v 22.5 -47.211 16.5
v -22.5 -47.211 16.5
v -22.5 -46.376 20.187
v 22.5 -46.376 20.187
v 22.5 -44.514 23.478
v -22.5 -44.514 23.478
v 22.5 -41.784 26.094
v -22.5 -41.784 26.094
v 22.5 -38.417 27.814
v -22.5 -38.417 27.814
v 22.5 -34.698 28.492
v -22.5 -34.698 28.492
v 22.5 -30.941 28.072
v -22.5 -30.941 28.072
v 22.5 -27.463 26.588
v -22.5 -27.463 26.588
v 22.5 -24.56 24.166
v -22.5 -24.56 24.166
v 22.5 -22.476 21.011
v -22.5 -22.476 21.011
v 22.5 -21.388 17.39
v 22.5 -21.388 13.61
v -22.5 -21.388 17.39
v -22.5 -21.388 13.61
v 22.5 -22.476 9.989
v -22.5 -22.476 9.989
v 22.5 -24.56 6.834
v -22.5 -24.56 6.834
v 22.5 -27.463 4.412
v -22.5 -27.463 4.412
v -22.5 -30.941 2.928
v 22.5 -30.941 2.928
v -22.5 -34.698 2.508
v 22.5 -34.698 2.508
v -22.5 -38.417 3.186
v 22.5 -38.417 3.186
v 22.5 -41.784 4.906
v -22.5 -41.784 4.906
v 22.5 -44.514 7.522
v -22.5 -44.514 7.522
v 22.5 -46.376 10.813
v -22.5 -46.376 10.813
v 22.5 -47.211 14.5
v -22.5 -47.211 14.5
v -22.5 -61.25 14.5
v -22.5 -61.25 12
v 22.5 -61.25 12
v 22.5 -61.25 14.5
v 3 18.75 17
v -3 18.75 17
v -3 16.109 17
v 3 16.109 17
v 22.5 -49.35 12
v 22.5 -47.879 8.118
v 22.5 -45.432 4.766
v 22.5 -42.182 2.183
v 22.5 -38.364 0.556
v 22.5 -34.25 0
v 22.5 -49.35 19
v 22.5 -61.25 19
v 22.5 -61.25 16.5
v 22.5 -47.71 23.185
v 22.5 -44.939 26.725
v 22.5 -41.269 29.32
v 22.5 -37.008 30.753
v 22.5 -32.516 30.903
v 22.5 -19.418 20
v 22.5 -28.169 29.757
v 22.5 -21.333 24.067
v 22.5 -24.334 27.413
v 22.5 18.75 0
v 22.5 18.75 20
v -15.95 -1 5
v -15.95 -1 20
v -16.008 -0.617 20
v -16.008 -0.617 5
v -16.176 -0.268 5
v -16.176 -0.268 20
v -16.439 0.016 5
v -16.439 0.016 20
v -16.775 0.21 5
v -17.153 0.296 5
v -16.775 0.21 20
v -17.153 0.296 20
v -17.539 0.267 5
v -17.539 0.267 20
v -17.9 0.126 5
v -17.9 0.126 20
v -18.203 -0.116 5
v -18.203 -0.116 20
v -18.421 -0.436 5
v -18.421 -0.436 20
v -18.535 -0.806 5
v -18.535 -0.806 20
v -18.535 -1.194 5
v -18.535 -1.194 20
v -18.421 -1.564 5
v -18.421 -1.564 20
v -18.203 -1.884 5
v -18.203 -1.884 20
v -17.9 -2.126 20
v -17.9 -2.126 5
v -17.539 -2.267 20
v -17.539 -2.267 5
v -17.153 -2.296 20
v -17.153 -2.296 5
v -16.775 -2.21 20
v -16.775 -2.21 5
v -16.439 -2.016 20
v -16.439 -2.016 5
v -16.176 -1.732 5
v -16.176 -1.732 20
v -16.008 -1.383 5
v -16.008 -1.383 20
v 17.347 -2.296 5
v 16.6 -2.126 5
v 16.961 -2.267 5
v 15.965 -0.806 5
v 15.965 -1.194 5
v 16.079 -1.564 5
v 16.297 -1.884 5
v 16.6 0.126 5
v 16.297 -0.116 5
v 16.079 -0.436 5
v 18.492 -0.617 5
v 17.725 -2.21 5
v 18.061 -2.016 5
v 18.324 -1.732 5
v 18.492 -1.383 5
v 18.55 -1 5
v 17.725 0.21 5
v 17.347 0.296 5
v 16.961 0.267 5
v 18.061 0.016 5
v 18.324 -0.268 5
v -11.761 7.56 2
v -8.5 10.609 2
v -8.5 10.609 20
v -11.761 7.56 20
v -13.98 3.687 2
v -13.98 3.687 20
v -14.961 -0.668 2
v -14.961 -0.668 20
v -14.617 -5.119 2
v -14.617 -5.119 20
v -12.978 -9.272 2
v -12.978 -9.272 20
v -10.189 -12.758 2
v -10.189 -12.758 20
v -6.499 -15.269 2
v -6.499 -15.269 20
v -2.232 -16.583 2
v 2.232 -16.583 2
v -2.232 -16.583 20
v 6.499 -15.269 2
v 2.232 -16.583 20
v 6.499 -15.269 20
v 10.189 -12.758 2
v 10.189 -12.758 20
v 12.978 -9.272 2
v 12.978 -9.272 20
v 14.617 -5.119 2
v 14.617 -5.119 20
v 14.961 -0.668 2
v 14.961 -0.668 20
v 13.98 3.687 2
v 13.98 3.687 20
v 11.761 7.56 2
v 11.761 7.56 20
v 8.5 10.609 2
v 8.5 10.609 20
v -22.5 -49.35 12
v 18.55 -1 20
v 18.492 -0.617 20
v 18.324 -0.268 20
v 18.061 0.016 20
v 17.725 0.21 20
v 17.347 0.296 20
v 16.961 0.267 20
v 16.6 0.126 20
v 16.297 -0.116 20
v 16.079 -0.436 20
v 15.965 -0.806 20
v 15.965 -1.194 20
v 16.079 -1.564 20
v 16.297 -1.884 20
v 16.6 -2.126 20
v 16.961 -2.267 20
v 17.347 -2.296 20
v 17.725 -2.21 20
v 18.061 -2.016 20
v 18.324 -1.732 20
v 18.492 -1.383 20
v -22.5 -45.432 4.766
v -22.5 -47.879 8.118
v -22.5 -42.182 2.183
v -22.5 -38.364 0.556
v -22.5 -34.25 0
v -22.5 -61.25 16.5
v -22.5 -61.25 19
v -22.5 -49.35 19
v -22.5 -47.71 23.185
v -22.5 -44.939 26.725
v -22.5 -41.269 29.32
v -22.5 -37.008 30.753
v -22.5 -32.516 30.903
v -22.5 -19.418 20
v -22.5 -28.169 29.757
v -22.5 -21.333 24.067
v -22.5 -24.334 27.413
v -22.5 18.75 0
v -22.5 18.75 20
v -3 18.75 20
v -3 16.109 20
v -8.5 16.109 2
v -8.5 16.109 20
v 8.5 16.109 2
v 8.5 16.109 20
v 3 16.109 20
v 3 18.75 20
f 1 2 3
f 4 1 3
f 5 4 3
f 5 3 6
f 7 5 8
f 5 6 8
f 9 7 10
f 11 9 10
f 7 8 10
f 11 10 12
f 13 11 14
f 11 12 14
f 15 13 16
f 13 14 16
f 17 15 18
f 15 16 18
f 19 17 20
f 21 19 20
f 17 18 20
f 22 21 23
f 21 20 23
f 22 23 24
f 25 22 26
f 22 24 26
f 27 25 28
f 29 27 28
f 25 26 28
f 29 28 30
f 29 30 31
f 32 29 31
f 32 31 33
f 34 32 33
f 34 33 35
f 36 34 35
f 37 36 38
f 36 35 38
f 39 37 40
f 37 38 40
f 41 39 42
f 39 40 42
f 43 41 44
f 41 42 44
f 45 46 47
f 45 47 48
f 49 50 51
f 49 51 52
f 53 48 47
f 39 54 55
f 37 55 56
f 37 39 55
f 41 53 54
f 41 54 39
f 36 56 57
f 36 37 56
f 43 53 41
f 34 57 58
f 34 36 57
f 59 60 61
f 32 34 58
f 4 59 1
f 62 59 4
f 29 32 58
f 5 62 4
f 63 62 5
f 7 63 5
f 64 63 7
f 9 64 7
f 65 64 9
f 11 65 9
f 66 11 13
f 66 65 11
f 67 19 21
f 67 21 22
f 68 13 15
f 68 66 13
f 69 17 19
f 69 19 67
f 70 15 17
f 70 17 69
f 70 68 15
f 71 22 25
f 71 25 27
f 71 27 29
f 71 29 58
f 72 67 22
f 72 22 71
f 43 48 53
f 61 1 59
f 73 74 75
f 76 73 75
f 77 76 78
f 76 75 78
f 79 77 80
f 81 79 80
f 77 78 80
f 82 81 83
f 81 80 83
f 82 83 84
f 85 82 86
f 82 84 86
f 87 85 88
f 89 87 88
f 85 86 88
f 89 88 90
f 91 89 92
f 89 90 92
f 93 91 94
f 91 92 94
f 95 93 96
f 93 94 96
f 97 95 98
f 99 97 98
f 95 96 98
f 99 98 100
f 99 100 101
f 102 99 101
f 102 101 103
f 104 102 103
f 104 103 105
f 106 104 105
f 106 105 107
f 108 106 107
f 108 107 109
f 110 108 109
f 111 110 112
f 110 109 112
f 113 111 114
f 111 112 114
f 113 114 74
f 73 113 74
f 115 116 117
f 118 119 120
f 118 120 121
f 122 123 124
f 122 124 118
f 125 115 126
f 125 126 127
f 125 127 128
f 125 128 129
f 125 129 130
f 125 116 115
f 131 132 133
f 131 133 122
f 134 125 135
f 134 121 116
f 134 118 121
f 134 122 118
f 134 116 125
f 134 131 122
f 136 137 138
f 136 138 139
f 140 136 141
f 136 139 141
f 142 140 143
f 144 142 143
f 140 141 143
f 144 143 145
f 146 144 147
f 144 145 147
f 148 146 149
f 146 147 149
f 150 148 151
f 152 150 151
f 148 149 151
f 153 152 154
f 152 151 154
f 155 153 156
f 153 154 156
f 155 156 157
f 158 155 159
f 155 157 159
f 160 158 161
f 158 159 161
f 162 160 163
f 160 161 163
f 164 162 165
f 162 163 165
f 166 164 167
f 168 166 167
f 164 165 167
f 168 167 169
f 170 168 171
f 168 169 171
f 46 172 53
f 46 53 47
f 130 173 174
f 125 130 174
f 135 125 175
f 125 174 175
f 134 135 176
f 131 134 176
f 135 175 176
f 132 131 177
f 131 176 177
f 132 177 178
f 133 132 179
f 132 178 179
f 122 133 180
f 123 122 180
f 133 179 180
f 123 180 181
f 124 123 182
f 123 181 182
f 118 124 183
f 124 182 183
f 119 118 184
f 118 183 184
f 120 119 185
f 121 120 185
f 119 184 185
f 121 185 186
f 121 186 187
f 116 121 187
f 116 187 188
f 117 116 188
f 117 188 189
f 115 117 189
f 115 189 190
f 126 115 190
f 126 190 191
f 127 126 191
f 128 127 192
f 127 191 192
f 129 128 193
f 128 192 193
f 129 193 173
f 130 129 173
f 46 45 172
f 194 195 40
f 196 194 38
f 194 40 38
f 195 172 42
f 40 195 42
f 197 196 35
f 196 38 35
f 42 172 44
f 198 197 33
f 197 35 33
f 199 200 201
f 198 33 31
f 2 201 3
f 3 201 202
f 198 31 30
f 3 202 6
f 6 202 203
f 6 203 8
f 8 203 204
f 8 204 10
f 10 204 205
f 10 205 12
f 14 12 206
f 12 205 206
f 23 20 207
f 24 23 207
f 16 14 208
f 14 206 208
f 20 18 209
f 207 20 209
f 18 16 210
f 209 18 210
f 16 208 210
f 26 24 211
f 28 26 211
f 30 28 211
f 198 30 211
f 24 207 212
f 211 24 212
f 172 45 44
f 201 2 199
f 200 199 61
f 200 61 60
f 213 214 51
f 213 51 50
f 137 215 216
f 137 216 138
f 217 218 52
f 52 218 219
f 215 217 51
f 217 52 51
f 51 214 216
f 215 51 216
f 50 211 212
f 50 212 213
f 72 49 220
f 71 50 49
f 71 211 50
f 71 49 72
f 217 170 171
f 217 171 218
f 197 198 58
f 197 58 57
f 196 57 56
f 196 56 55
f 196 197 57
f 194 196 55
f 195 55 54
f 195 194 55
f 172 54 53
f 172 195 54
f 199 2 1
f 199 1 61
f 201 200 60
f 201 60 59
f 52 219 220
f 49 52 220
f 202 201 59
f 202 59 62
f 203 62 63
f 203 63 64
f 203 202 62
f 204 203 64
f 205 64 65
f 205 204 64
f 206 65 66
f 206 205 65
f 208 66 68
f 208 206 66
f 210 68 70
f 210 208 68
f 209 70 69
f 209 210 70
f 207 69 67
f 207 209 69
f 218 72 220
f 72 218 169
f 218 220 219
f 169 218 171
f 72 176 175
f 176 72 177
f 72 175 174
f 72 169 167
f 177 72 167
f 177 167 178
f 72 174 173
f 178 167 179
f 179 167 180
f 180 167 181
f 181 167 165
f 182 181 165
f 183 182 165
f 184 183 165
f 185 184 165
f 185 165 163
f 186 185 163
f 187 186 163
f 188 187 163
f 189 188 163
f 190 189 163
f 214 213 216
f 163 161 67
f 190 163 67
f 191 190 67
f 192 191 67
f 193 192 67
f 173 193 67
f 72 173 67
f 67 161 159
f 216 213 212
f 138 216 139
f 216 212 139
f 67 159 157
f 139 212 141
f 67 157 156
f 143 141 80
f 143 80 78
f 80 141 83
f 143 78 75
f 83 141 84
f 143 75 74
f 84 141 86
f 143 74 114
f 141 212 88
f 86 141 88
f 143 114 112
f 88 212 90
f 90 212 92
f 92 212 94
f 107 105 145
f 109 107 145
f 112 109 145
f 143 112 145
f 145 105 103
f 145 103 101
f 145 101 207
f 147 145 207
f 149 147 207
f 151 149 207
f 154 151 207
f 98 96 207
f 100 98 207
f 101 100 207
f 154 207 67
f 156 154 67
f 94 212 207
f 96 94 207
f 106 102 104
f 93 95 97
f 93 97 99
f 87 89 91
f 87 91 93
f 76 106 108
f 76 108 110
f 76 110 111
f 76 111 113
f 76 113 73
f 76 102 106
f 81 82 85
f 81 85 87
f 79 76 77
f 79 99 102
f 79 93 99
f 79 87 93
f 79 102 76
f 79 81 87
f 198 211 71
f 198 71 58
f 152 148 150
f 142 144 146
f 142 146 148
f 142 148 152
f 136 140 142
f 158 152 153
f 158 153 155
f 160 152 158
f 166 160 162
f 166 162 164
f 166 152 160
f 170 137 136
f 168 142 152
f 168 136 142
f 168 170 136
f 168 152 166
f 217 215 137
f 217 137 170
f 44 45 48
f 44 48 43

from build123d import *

# Parameters (mm, degrees)
SKETCH_W        = 45
SKETCH_H        = 37.5
PAD_DEPTH       = 20
POCKET_DEPTH    = 18
SKETCH002_R     = 1.3
POCKET003_DEPTH = 15
SKETCH003_W     = 6
SKETCH003_H     = 2.6407929057
POCKET001_DEPTH = 3
PAD002_DEPTH    = 45


with BuildPart() as part:
    # Sketch → Pad (new body)
    with BuildSketch(Plane.XY):
        Rectangle(SKETCH_W, SKETCH_H)
    extrude(amount=PAD_DEPTH)

    # Sketch001 (on Face6 of Pad) → Pocket (cut)
    with BuildSketch(Plane.XY.offset(20)):
        with BuildLine():
            Line((8.5, 10.6092070943), (8.5, 16.1092070943))
            Line((8.5, 16.1092070943), (-8.5, 16.1092070943))
            Line((-8.5, 16.1092070943), (-8.5, 10.6092070943))
            ThreePointArc((-8.5, 10.6092070943), (0, -16.75), (8.5, 10.6092070943))
        make_face()
    extrude(amount=-POCKET_DEPTH, mode=Mode.SUBTRACT)

    # Sketch002 (on Face5 of Pocket) → Pocket003 (cut)
    with BuildSketch(Plane.XY.offset(20)):
        with Locations((-17.25, -1)):
            Circle(SKETCH002_R)
        with Locations((17.25, -1)):
            Circle(SKETCH002_R)
    extrude(amount=-POCKET003_DEPTH, mode=Mode.SUBTRACT)

    # Sketch003 (on Face5 of Pocket003) → Pocket001 (cut)
    with BuildSketch(Plane.XY.offset(20)):
        with Locations((0, 17.4296035472)):
            Rectangle(SKETCH003_W, SKETCH003_H)
    extrude(amount=-POCKET001_DEPTH, mode=Mode.SUBTRACT)

    # Sketch006 (on Face8 of Pocket001) → Pad002 (join)
    with BuildSketch(Plane(origin=(-22.5, 0, 0), x_dir=(0, -1, 0), z_dir=(-1, 0, 0))):
        with BuildLine():
            ThreePointArc((47.2114813968, 16.5), (21.25, 15.5), (47.2114813968, 14.5))
            Line((61.25, 14.5), (47.2114813968, 14.5))
            Line((61.25, 12), (61.25, 14.5))
            Line((49.3496688705, 12), (61.25, 12))
            ThreePointArc((34.2500364402, 0), (43.8936650252, 3.3653502365), (49.3496688705, 12))
            Line((18.75, 0), (34.2500364402, 0))
            Line((18.75, 0), (18.75, 20))
            Line((18.75, 20), (19.4176030258, 20))
            ThreePointArc((49.3496688705, 19), (34.767550545, 30.9913569913), (19.4176030258, 20))
            Line((61.25, 19), (49.3496688705, 19))
            Line((61.25, 16.5), (61.25, 19))
            Line((47.2114813968, 16.5), (61.25, 16.5))
        make_face()
    extrude(amount=-PAD002_DEPTH)


solid = part.part
